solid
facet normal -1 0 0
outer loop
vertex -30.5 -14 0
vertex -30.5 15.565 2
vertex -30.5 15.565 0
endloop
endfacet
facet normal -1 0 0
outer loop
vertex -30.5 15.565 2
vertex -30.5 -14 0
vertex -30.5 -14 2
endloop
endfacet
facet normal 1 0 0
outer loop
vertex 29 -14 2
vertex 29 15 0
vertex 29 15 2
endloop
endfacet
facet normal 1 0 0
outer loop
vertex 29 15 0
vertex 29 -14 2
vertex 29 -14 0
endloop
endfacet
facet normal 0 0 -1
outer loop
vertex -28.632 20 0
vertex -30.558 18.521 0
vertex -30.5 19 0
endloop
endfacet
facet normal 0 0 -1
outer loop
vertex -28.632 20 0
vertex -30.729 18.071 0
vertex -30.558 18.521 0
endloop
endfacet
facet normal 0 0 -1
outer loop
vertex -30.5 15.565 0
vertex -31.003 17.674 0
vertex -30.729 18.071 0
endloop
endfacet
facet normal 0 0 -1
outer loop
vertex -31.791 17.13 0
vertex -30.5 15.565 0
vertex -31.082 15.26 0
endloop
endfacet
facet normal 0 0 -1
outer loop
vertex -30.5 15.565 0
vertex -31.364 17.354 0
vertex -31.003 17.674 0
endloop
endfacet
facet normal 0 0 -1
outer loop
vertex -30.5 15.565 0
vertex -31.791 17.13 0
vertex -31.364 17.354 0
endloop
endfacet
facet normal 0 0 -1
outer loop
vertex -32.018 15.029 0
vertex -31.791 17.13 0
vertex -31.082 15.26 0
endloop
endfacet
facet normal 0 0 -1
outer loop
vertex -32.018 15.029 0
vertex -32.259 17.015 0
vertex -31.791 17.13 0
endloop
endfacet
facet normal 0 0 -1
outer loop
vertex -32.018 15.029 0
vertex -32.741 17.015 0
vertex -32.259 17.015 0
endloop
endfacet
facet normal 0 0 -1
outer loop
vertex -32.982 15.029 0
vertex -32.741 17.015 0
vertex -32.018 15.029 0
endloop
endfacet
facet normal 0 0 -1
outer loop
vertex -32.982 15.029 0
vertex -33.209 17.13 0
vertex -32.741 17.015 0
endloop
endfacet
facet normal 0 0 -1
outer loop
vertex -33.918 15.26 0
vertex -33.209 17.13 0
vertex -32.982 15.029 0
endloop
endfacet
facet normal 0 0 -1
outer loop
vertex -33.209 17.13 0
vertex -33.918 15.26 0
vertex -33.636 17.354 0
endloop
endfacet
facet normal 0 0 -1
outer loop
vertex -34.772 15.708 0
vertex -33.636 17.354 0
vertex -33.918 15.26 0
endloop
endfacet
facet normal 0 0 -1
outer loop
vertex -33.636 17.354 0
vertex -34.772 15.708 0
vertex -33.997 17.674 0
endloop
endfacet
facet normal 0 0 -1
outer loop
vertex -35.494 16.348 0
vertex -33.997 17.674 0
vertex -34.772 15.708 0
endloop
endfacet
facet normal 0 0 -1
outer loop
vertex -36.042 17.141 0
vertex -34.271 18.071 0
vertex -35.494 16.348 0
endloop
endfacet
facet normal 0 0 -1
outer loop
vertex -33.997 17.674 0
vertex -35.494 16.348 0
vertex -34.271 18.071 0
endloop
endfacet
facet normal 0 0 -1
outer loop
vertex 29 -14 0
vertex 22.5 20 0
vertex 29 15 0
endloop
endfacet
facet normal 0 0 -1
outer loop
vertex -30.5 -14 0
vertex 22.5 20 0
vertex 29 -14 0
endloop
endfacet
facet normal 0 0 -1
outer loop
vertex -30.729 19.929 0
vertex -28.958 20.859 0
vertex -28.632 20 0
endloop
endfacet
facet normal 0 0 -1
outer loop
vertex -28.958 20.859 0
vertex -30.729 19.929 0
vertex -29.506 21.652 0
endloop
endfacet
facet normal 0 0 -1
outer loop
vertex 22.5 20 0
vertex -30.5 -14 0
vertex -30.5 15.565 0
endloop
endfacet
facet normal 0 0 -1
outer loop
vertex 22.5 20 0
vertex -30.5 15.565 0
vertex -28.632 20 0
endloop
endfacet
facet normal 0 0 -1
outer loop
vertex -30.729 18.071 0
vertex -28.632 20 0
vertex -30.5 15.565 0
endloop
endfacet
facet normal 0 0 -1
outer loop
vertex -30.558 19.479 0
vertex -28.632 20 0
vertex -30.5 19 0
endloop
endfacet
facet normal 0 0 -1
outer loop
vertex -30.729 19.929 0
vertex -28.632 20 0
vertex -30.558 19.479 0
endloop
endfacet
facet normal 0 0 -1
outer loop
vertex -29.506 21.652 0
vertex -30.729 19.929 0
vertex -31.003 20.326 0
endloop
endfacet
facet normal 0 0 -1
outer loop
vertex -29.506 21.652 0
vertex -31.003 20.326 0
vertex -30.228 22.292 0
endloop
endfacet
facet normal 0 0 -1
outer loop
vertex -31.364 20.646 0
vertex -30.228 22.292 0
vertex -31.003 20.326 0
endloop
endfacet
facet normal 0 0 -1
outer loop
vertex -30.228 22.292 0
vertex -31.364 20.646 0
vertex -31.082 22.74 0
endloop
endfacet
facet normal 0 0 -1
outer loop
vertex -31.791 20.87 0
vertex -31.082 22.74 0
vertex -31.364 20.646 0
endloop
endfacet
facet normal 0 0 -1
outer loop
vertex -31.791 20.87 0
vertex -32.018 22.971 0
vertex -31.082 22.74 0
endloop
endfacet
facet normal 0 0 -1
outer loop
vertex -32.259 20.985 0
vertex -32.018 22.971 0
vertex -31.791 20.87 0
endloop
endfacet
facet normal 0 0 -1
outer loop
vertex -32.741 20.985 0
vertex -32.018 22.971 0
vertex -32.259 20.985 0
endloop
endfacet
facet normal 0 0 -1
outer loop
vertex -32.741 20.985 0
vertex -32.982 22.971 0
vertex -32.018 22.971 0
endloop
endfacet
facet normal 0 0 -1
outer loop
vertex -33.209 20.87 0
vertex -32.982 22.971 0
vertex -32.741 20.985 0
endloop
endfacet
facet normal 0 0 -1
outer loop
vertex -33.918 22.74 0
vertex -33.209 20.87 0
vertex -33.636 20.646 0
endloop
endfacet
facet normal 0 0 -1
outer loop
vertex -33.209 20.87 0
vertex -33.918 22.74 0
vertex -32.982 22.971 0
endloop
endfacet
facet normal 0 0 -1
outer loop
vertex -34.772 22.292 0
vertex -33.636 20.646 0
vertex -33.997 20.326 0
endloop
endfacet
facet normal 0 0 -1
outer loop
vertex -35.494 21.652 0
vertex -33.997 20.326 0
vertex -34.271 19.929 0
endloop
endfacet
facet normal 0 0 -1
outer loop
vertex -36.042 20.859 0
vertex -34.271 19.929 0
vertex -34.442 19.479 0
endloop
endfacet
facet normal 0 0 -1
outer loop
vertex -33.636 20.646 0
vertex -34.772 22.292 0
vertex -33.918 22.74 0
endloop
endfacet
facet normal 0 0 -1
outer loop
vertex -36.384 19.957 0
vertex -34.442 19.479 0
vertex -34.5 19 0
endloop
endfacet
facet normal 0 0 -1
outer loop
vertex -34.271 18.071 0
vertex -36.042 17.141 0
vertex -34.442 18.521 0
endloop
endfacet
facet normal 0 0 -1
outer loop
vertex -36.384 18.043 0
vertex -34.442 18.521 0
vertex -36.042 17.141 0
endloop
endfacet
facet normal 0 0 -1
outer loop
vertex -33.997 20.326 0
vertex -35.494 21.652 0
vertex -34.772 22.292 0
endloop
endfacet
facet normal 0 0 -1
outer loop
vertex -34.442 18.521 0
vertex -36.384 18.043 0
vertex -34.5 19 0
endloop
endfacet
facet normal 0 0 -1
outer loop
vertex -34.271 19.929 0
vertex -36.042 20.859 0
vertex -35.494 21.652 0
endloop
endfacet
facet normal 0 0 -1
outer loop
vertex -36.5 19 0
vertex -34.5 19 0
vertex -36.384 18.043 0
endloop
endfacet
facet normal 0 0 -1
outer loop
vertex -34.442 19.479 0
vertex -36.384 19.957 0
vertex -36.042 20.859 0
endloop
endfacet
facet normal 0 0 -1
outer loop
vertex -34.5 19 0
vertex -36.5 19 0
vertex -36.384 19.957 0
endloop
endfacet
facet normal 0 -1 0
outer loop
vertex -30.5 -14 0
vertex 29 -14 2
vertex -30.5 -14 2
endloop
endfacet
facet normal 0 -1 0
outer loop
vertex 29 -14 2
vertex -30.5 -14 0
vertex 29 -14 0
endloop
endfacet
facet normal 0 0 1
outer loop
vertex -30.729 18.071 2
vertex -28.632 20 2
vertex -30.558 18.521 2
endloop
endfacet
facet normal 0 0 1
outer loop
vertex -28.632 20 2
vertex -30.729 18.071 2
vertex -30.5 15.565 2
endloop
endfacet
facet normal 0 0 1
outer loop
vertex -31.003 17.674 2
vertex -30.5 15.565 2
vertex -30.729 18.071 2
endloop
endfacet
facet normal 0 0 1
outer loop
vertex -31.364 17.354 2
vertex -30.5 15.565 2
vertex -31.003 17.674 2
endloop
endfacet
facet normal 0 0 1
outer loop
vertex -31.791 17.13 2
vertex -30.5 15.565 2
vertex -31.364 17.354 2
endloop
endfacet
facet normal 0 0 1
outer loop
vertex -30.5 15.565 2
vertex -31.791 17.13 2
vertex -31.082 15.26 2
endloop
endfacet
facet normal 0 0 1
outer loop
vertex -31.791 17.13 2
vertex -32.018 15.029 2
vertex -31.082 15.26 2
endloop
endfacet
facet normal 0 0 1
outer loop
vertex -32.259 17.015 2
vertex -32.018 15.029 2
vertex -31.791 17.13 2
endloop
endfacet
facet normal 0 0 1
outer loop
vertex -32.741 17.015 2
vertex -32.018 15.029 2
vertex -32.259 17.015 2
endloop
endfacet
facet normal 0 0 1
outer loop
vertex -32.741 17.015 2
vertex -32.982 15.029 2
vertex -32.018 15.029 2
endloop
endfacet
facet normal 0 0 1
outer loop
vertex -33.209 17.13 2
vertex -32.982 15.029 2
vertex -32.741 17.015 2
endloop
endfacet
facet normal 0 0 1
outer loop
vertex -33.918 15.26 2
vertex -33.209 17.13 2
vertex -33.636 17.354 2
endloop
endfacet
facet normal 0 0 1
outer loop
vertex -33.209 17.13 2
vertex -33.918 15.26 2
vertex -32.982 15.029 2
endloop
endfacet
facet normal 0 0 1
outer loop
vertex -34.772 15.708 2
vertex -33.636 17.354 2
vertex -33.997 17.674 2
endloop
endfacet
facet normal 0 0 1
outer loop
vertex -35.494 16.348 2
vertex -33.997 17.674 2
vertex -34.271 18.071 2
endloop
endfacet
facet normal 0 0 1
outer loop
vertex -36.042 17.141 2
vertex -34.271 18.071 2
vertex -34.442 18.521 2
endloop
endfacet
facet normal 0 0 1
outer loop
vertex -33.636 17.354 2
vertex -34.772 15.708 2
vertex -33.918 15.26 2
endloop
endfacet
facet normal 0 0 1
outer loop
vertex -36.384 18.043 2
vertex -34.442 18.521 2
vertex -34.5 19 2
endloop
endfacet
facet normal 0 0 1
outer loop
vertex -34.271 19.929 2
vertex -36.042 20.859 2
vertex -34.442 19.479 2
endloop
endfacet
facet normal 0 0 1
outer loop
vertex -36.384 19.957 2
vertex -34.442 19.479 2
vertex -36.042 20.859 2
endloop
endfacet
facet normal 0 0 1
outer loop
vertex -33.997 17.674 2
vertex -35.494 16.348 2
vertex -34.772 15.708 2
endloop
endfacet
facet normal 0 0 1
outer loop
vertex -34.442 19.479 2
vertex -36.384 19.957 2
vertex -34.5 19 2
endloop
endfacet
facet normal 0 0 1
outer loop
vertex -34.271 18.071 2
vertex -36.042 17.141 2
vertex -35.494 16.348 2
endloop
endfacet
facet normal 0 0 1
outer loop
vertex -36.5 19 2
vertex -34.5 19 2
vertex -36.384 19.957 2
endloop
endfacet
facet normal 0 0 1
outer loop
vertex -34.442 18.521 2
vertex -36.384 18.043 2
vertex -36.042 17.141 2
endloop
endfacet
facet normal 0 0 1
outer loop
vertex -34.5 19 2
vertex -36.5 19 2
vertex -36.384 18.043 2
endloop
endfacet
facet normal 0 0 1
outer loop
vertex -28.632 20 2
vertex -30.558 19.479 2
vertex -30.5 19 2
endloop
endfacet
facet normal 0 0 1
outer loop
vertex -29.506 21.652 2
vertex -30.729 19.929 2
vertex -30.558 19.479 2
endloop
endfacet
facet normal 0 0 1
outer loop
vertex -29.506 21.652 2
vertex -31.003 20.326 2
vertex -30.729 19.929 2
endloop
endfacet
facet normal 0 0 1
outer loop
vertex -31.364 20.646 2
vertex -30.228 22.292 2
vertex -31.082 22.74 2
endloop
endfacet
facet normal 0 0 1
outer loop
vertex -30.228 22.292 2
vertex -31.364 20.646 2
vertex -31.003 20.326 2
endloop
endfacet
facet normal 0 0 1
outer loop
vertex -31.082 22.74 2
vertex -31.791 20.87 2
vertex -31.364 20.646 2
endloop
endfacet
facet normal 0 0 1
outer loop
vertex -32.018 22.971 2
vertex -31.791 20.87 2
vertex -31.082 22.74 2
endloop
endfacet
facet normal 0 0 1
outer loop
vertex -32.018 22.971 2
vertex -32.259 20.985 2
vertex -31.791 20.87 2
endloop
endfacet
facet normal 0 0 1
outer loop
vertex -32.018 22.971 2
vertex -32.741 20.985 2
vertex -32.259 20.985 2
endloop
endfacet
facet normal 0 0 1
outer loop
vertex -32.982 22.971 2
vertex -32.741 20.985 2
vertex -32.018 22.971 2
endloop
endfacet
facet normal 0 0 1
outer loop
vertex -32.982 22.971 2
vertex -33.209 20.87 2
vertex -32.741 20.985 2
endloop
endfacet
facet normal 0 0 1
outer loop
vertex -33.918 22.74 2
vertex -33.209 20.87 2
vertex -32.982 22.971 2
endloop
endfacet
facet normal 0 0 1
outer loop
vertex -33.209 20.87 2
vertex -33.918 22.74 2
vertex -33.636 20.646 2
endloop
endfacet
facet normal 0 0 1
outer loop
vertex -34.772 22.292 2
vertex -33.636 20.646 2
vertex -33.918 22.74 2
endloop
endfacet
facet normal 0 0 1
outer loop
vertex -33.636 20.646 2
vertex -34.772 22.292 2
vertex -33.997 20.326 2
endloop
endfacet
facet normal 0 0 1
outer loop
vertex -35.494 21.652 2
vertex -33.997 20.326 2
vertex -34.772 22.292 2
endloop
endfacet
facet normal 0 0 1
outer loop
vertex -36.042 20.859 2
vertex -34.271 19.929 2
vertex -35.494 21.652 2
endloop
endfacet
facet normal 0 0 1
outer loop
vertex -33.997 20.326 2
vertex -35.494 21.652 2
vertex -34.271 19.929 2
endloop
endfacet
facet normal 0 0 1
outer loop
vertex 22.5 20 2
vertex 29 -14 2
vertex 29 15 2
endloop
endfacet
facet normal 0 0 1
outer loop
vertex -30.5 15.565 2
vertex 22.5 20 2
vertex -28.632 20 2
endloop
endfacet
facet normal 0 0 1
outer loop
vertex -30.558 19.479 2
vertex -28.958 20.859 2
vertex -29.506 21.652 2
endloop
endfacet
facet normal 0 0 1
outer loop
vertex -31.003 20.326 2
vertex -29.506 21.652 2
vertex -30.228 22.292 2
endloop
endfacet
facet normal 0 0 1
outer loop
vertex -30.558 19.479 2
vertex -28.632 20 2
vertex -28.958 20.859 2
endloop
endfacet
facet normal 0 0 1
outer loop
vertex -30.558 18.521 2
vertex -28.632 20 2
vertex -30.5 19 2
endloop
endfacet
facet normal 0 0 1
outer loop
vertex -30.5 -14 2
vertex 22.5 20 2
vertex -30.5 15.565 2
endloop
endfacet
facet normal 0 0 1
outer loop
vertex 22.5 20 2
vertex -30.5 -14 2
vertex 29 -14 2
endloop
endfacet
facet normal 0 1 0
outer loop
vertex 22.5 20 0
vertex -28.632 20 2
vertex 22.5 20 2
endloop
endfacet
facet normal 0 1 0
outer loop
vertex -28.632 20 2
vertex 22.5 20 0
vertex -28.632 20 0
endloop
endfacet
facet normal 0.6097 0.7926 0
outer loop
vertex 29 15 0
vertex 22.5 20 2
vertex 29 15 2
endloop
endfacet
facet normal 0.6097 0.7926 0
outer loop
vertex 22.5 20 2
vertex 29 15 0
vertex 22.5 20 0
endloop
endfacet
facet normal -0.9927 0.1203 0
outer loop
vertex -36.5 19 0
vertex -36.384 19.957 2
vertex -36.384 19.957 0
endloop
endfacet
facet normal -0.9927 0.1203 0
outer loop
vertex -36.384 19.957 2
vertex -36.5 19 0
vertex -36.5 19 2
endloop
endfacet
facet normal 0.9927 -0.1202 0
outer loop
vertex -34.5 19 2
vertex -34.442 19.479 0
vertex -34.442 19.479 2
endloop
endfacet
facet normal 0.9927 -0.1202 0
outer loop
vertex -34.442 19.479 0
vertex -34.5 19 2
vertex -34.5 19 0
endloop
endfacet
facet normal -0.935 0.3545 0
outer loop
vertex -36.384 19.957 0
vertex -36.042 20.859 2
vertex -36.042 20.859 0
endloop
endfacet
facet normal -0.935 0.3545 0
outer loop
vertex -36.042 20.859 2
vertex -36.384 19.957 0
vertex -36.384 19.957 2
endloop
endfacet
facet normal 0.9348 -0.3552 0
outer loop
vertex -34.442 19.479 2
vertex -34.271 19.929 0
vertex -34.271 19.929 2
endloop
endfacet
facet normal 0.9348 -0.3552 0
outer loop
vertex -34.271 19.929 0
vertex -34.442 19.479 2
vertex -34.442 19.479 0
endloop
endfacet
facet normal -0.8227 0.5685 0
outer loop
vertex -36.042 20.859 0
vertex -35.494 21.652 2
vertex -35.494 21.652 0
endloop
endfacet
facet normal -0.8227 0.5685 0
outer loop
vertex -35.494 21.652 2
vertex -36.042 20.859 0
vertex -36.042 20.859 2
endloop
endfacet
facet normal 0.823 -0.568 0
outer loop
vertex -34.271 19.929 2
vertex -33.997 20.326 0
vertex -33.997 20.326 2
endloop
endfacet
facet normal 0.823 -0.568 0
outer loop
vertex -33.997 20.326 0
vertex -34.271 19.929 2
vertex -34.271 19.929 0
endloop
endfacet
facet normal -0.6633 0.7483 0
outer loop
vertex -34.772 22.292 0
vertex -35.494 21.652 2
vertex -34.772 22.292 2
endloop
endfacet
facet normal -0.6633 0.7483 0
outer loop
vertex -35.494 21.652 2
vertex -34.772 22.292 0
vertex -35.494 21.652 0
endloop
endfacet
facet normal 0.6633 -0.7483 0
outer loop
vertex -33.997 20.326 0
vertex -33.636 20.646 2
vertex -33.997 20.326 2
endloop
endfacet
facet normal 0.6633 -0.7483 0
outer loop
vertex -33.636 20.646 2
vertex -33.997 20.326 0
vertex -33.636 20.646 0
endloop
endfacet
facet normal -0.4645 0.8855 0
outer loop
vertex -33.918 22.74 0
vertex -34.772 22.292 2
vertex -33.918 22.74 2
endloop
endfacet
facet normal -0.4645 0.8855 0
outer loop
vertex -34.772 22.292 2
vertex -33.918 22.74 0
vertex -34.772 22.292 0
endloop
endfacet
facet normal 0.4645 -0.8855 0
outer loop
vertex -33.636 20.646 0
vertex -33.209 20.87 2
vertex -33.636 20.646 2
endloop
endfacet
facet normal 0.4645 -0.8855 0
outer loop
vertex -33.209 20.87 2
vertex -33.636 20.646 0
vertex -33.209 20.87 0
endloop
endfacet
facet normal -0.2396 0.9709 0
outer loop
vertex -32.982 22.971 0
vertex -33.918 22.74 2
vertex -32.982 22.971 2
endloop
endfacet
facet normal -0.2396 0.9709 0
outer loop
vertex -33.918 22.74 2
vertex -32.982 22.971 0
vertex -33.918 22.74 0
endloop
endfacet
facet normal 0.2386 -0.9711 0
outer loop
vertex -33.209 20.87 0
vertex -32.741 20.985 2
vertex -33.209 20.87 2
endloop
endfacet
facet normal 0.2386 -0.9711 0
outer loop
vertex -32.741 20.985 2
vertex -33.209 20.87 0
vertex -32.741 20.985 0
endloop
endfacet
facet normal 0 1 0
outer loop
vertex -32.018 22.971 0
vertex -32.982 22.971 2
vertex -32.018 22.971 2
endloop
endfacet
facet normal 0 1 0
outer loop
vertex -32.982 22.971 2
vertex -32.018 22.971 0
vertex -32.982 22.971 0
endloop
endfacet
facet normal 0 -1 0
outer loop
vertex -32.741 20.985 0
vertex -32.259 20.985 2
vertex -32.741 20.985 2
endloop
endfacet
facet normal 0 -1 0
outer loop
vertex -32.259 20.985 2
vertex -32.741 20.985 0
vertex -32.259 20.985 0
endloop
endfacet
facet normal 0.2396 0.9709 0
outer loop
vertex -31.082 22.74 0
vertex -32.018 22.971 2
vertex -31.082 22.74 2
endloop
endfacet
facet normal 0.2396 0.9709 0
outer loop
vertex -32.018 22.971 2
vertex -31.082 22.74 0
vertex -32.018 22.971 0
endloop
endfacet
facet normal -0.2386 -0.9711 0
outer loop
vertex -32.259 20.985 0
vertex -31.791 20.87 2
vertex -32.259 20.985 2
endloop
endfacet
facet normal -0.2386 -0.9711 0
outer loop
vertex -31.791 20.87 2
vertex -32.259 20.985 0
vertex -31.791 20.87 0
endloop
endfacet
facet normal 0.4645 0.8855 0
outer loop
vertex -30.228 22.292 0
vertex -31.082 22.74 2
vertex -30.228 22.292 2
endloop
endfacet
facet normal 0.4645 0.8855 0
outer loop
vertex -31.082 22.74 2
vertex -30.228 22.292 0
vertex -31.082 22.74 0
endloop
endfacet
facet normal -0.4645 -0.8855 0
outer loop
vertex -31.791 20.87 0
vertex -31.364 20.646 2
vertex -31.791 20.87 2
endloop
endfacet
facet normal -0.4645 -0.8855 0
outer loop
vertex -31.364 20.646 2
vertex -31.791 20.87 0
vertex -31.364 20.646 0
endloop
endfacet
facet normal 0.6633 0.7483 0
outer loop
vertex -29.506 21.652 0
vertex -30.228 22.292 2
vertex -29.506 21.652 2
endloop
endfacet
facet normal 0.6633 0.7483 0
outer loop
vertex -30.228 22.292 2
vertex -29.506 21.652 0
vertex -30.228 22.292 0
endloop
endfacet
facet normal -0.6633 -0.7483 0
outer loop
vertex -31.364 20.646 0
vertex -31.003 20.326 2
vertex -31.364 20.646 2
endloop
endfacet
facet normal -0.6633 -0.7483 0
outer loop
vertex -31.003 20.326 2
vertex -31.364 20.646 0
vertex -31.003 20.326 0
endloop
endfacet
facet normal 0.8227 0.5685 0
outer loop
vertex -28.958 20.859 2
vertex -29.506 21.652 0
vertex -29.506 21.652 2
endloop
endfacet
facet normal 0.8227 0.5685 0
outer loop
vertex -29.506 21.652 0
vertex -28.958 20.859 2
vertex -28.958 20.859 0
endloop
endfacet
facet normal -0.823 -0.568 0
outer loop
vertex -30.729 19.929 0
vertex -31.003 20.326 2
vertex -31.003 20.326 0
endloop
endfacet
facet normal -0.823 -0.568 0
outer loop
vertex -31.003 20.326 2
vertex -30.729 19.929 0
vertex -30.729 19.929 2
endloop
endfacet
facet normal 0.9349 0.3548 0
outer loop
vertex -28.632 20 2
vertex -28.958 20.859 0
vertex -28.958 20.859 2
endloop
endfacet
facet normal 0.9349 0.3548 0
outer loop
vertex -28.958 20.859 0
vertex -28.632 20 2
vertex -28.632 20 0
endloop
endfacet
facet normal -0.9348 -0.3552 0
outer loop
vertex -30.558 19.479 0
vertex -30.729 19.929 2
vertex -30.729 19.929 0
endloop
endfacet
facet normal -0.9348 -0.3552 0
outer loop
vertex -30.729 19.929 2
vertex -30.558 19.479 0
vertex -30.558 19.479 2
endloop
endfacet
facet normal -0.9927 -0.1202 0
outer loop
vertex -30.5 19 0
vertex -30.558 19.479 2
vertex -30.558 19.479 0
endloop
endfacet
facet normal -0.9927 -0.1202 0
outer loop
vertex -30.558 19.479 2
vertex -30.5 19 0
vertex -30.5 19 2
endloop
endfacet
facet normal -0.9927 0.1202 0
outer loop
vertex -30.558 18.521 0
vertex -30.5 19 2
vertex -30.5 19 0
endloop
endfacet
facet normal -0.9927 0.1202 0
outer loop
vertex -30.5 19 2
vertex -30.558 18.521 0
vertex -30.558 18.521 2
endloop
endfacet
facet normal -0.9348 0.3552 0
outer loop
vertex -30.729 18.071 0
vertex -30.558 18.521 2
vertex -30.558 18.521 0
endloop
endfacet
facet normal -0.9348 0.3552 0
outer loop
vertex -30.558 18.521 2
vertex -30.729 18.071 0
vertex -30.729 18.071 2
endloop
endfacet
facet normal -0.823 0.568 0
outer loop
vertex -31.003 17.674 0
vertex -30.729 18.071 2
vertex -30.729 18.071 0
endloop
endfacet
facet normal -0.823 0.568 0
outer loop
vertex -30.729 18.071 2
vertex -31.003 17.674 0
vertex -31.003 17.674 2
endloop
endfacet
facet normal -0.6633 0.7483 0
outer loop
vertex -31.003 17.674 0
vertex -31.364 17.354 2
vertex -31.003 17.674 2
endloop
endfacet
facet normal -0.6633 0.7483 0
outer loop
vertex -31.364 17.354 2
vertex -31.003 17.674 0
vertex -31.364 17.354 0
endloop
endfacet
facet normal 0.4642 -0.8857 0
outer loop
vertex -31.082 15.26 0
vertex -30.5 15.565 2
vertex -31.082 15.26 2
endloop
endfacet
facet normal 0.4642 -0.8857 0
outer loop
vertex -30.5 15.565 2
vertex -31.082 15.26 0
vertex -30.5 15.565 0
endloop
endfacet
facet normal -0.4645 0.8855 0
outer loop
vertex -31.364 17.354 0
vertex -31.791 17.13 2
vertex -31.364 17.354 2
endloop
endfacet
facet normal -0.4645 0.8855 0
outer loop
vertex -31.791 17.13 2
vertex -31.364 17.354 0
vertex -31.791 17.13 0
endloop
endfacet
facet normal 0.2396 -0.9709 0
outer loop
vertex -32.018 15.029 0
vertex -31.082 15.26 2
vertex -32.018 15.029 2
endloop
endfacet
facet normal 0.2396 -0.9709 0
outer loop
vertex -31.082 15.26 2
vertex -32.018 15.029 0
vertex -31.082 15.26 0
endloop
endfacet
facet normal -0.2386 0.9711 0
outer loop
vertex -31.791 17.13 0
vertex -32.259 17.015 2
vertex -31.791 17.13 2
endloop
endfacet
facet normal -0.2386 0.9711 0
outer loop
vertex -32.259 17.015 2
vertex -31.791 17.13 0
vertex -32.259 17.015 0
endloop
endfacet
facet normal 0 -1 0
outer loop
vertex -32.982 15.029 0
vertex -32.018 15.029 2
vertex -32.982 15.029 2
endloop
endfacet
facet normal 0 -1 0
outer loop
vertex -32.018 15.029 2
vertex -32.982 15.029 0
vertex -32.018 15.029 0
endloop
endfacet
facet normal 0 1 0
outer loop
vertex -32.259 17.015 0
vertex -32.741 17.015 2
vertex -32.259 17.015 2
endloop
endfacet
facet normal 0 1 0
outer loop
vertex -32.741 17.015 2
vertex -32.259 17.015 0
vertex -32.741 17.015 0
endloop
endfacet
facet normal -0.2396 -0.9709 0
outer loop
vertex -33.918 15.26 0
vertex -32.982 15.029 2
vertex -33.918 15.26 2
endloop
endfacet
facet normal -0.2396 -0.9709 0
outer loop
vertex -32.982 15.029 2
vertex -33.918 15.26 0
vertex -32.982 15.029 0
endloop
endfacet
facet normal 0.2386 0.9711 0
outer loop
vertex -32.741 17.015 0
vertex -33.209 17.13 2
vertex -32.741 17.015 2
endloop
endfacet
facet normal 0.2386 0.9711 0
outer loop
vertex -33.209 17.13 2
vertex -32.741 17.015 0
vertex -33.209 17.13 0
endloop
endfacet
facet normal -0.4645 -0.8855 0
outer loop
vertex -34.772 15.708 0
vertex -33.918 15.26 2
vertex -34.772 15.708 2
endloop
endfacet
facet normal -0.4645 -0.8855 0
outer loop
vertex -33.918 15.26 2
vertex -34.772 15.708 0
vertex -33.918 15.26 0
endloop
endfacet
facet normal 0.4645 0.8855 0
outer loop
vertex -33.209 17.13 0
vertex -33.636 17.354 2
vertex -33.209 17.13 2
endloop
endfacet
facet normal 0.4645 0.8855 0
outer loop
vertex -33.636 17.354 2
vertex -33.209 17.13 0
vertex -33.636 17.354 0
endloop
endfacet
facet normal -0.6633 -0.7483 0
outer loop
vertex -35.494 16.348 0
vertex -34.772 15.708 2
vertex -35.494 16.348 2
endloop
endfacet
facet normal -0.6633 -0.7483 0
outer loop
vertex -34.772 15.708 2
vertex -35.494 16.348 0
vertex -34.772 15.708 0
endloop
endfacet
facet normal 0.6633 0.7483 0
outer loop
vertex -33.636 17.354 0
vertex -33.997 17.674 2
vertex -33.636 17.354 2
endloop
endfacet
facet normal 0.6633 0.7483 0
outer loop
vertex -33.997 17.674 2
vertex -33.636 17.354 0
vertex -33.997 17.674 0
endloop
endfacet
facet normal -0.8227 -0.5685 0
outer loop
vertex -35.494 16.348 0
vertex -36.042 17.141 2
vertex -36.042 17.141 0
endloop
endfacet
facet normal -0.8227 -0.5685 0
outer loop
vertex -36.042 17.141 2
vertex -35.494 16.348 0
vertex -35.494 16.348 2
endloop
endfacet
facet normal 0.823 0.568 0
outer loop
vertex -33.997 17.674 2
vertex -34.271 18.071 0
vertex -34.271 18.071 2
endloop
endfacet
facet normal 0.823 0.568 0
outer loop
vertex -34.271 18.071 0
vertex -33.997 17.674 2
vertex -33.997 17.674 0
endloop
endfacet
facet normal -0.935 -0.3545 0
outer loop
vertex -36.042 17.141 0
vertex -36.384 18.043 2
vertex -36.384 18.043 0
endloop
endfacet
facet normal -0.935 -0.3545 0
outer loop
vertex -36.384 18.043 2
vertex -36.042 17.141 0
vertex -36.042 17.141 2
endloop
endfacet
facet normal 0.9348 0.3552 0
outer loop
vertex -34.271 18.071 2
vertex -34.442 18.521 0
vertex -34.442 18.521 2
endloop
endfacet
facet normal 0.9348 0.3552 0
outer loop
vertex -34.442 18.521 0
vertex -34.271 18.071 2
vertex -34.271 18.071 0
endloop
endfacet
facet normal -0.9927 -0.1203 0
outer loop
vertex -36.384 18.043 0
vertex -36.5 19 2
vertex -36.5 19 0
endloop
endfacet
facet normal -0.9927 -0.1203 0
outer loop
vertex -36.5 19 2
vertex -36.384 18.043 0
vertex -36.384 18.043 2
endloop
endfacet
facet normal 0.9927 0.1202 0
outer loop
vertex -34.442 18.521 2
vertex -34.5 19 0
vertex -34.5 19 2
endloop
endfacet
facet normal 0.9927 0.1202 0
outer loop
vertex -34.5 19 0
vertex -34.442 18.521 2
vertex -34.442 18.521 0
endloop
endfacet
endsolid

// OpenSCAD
difference () {
  color ("blue")
    scale ([.5,.5,1])
    translate ([0,0,0])
    linear_extrude(height = 2.0, center = false)
    polygon([[-61,-28],[-61,40],[45,40],[58,30],[58,-28]]);
  color ("red")
    scale ([.5,.5,1])
    translate ([0,0,0])
    linear_extrude(height = 2.0, center = false) 
    import ("/Users/rstmini/Documents/HackBergen/HackBergenLogo-wo-back.dxf", origin=[195,10]);
}

color ("blue")
  scale ([.5,.5,1]) 
  translate([-65, 38, 0]) 
  rotate_extrude(convexity = 10) 
  translate([4, 0, 0])
  square ([4,2],center =false);
